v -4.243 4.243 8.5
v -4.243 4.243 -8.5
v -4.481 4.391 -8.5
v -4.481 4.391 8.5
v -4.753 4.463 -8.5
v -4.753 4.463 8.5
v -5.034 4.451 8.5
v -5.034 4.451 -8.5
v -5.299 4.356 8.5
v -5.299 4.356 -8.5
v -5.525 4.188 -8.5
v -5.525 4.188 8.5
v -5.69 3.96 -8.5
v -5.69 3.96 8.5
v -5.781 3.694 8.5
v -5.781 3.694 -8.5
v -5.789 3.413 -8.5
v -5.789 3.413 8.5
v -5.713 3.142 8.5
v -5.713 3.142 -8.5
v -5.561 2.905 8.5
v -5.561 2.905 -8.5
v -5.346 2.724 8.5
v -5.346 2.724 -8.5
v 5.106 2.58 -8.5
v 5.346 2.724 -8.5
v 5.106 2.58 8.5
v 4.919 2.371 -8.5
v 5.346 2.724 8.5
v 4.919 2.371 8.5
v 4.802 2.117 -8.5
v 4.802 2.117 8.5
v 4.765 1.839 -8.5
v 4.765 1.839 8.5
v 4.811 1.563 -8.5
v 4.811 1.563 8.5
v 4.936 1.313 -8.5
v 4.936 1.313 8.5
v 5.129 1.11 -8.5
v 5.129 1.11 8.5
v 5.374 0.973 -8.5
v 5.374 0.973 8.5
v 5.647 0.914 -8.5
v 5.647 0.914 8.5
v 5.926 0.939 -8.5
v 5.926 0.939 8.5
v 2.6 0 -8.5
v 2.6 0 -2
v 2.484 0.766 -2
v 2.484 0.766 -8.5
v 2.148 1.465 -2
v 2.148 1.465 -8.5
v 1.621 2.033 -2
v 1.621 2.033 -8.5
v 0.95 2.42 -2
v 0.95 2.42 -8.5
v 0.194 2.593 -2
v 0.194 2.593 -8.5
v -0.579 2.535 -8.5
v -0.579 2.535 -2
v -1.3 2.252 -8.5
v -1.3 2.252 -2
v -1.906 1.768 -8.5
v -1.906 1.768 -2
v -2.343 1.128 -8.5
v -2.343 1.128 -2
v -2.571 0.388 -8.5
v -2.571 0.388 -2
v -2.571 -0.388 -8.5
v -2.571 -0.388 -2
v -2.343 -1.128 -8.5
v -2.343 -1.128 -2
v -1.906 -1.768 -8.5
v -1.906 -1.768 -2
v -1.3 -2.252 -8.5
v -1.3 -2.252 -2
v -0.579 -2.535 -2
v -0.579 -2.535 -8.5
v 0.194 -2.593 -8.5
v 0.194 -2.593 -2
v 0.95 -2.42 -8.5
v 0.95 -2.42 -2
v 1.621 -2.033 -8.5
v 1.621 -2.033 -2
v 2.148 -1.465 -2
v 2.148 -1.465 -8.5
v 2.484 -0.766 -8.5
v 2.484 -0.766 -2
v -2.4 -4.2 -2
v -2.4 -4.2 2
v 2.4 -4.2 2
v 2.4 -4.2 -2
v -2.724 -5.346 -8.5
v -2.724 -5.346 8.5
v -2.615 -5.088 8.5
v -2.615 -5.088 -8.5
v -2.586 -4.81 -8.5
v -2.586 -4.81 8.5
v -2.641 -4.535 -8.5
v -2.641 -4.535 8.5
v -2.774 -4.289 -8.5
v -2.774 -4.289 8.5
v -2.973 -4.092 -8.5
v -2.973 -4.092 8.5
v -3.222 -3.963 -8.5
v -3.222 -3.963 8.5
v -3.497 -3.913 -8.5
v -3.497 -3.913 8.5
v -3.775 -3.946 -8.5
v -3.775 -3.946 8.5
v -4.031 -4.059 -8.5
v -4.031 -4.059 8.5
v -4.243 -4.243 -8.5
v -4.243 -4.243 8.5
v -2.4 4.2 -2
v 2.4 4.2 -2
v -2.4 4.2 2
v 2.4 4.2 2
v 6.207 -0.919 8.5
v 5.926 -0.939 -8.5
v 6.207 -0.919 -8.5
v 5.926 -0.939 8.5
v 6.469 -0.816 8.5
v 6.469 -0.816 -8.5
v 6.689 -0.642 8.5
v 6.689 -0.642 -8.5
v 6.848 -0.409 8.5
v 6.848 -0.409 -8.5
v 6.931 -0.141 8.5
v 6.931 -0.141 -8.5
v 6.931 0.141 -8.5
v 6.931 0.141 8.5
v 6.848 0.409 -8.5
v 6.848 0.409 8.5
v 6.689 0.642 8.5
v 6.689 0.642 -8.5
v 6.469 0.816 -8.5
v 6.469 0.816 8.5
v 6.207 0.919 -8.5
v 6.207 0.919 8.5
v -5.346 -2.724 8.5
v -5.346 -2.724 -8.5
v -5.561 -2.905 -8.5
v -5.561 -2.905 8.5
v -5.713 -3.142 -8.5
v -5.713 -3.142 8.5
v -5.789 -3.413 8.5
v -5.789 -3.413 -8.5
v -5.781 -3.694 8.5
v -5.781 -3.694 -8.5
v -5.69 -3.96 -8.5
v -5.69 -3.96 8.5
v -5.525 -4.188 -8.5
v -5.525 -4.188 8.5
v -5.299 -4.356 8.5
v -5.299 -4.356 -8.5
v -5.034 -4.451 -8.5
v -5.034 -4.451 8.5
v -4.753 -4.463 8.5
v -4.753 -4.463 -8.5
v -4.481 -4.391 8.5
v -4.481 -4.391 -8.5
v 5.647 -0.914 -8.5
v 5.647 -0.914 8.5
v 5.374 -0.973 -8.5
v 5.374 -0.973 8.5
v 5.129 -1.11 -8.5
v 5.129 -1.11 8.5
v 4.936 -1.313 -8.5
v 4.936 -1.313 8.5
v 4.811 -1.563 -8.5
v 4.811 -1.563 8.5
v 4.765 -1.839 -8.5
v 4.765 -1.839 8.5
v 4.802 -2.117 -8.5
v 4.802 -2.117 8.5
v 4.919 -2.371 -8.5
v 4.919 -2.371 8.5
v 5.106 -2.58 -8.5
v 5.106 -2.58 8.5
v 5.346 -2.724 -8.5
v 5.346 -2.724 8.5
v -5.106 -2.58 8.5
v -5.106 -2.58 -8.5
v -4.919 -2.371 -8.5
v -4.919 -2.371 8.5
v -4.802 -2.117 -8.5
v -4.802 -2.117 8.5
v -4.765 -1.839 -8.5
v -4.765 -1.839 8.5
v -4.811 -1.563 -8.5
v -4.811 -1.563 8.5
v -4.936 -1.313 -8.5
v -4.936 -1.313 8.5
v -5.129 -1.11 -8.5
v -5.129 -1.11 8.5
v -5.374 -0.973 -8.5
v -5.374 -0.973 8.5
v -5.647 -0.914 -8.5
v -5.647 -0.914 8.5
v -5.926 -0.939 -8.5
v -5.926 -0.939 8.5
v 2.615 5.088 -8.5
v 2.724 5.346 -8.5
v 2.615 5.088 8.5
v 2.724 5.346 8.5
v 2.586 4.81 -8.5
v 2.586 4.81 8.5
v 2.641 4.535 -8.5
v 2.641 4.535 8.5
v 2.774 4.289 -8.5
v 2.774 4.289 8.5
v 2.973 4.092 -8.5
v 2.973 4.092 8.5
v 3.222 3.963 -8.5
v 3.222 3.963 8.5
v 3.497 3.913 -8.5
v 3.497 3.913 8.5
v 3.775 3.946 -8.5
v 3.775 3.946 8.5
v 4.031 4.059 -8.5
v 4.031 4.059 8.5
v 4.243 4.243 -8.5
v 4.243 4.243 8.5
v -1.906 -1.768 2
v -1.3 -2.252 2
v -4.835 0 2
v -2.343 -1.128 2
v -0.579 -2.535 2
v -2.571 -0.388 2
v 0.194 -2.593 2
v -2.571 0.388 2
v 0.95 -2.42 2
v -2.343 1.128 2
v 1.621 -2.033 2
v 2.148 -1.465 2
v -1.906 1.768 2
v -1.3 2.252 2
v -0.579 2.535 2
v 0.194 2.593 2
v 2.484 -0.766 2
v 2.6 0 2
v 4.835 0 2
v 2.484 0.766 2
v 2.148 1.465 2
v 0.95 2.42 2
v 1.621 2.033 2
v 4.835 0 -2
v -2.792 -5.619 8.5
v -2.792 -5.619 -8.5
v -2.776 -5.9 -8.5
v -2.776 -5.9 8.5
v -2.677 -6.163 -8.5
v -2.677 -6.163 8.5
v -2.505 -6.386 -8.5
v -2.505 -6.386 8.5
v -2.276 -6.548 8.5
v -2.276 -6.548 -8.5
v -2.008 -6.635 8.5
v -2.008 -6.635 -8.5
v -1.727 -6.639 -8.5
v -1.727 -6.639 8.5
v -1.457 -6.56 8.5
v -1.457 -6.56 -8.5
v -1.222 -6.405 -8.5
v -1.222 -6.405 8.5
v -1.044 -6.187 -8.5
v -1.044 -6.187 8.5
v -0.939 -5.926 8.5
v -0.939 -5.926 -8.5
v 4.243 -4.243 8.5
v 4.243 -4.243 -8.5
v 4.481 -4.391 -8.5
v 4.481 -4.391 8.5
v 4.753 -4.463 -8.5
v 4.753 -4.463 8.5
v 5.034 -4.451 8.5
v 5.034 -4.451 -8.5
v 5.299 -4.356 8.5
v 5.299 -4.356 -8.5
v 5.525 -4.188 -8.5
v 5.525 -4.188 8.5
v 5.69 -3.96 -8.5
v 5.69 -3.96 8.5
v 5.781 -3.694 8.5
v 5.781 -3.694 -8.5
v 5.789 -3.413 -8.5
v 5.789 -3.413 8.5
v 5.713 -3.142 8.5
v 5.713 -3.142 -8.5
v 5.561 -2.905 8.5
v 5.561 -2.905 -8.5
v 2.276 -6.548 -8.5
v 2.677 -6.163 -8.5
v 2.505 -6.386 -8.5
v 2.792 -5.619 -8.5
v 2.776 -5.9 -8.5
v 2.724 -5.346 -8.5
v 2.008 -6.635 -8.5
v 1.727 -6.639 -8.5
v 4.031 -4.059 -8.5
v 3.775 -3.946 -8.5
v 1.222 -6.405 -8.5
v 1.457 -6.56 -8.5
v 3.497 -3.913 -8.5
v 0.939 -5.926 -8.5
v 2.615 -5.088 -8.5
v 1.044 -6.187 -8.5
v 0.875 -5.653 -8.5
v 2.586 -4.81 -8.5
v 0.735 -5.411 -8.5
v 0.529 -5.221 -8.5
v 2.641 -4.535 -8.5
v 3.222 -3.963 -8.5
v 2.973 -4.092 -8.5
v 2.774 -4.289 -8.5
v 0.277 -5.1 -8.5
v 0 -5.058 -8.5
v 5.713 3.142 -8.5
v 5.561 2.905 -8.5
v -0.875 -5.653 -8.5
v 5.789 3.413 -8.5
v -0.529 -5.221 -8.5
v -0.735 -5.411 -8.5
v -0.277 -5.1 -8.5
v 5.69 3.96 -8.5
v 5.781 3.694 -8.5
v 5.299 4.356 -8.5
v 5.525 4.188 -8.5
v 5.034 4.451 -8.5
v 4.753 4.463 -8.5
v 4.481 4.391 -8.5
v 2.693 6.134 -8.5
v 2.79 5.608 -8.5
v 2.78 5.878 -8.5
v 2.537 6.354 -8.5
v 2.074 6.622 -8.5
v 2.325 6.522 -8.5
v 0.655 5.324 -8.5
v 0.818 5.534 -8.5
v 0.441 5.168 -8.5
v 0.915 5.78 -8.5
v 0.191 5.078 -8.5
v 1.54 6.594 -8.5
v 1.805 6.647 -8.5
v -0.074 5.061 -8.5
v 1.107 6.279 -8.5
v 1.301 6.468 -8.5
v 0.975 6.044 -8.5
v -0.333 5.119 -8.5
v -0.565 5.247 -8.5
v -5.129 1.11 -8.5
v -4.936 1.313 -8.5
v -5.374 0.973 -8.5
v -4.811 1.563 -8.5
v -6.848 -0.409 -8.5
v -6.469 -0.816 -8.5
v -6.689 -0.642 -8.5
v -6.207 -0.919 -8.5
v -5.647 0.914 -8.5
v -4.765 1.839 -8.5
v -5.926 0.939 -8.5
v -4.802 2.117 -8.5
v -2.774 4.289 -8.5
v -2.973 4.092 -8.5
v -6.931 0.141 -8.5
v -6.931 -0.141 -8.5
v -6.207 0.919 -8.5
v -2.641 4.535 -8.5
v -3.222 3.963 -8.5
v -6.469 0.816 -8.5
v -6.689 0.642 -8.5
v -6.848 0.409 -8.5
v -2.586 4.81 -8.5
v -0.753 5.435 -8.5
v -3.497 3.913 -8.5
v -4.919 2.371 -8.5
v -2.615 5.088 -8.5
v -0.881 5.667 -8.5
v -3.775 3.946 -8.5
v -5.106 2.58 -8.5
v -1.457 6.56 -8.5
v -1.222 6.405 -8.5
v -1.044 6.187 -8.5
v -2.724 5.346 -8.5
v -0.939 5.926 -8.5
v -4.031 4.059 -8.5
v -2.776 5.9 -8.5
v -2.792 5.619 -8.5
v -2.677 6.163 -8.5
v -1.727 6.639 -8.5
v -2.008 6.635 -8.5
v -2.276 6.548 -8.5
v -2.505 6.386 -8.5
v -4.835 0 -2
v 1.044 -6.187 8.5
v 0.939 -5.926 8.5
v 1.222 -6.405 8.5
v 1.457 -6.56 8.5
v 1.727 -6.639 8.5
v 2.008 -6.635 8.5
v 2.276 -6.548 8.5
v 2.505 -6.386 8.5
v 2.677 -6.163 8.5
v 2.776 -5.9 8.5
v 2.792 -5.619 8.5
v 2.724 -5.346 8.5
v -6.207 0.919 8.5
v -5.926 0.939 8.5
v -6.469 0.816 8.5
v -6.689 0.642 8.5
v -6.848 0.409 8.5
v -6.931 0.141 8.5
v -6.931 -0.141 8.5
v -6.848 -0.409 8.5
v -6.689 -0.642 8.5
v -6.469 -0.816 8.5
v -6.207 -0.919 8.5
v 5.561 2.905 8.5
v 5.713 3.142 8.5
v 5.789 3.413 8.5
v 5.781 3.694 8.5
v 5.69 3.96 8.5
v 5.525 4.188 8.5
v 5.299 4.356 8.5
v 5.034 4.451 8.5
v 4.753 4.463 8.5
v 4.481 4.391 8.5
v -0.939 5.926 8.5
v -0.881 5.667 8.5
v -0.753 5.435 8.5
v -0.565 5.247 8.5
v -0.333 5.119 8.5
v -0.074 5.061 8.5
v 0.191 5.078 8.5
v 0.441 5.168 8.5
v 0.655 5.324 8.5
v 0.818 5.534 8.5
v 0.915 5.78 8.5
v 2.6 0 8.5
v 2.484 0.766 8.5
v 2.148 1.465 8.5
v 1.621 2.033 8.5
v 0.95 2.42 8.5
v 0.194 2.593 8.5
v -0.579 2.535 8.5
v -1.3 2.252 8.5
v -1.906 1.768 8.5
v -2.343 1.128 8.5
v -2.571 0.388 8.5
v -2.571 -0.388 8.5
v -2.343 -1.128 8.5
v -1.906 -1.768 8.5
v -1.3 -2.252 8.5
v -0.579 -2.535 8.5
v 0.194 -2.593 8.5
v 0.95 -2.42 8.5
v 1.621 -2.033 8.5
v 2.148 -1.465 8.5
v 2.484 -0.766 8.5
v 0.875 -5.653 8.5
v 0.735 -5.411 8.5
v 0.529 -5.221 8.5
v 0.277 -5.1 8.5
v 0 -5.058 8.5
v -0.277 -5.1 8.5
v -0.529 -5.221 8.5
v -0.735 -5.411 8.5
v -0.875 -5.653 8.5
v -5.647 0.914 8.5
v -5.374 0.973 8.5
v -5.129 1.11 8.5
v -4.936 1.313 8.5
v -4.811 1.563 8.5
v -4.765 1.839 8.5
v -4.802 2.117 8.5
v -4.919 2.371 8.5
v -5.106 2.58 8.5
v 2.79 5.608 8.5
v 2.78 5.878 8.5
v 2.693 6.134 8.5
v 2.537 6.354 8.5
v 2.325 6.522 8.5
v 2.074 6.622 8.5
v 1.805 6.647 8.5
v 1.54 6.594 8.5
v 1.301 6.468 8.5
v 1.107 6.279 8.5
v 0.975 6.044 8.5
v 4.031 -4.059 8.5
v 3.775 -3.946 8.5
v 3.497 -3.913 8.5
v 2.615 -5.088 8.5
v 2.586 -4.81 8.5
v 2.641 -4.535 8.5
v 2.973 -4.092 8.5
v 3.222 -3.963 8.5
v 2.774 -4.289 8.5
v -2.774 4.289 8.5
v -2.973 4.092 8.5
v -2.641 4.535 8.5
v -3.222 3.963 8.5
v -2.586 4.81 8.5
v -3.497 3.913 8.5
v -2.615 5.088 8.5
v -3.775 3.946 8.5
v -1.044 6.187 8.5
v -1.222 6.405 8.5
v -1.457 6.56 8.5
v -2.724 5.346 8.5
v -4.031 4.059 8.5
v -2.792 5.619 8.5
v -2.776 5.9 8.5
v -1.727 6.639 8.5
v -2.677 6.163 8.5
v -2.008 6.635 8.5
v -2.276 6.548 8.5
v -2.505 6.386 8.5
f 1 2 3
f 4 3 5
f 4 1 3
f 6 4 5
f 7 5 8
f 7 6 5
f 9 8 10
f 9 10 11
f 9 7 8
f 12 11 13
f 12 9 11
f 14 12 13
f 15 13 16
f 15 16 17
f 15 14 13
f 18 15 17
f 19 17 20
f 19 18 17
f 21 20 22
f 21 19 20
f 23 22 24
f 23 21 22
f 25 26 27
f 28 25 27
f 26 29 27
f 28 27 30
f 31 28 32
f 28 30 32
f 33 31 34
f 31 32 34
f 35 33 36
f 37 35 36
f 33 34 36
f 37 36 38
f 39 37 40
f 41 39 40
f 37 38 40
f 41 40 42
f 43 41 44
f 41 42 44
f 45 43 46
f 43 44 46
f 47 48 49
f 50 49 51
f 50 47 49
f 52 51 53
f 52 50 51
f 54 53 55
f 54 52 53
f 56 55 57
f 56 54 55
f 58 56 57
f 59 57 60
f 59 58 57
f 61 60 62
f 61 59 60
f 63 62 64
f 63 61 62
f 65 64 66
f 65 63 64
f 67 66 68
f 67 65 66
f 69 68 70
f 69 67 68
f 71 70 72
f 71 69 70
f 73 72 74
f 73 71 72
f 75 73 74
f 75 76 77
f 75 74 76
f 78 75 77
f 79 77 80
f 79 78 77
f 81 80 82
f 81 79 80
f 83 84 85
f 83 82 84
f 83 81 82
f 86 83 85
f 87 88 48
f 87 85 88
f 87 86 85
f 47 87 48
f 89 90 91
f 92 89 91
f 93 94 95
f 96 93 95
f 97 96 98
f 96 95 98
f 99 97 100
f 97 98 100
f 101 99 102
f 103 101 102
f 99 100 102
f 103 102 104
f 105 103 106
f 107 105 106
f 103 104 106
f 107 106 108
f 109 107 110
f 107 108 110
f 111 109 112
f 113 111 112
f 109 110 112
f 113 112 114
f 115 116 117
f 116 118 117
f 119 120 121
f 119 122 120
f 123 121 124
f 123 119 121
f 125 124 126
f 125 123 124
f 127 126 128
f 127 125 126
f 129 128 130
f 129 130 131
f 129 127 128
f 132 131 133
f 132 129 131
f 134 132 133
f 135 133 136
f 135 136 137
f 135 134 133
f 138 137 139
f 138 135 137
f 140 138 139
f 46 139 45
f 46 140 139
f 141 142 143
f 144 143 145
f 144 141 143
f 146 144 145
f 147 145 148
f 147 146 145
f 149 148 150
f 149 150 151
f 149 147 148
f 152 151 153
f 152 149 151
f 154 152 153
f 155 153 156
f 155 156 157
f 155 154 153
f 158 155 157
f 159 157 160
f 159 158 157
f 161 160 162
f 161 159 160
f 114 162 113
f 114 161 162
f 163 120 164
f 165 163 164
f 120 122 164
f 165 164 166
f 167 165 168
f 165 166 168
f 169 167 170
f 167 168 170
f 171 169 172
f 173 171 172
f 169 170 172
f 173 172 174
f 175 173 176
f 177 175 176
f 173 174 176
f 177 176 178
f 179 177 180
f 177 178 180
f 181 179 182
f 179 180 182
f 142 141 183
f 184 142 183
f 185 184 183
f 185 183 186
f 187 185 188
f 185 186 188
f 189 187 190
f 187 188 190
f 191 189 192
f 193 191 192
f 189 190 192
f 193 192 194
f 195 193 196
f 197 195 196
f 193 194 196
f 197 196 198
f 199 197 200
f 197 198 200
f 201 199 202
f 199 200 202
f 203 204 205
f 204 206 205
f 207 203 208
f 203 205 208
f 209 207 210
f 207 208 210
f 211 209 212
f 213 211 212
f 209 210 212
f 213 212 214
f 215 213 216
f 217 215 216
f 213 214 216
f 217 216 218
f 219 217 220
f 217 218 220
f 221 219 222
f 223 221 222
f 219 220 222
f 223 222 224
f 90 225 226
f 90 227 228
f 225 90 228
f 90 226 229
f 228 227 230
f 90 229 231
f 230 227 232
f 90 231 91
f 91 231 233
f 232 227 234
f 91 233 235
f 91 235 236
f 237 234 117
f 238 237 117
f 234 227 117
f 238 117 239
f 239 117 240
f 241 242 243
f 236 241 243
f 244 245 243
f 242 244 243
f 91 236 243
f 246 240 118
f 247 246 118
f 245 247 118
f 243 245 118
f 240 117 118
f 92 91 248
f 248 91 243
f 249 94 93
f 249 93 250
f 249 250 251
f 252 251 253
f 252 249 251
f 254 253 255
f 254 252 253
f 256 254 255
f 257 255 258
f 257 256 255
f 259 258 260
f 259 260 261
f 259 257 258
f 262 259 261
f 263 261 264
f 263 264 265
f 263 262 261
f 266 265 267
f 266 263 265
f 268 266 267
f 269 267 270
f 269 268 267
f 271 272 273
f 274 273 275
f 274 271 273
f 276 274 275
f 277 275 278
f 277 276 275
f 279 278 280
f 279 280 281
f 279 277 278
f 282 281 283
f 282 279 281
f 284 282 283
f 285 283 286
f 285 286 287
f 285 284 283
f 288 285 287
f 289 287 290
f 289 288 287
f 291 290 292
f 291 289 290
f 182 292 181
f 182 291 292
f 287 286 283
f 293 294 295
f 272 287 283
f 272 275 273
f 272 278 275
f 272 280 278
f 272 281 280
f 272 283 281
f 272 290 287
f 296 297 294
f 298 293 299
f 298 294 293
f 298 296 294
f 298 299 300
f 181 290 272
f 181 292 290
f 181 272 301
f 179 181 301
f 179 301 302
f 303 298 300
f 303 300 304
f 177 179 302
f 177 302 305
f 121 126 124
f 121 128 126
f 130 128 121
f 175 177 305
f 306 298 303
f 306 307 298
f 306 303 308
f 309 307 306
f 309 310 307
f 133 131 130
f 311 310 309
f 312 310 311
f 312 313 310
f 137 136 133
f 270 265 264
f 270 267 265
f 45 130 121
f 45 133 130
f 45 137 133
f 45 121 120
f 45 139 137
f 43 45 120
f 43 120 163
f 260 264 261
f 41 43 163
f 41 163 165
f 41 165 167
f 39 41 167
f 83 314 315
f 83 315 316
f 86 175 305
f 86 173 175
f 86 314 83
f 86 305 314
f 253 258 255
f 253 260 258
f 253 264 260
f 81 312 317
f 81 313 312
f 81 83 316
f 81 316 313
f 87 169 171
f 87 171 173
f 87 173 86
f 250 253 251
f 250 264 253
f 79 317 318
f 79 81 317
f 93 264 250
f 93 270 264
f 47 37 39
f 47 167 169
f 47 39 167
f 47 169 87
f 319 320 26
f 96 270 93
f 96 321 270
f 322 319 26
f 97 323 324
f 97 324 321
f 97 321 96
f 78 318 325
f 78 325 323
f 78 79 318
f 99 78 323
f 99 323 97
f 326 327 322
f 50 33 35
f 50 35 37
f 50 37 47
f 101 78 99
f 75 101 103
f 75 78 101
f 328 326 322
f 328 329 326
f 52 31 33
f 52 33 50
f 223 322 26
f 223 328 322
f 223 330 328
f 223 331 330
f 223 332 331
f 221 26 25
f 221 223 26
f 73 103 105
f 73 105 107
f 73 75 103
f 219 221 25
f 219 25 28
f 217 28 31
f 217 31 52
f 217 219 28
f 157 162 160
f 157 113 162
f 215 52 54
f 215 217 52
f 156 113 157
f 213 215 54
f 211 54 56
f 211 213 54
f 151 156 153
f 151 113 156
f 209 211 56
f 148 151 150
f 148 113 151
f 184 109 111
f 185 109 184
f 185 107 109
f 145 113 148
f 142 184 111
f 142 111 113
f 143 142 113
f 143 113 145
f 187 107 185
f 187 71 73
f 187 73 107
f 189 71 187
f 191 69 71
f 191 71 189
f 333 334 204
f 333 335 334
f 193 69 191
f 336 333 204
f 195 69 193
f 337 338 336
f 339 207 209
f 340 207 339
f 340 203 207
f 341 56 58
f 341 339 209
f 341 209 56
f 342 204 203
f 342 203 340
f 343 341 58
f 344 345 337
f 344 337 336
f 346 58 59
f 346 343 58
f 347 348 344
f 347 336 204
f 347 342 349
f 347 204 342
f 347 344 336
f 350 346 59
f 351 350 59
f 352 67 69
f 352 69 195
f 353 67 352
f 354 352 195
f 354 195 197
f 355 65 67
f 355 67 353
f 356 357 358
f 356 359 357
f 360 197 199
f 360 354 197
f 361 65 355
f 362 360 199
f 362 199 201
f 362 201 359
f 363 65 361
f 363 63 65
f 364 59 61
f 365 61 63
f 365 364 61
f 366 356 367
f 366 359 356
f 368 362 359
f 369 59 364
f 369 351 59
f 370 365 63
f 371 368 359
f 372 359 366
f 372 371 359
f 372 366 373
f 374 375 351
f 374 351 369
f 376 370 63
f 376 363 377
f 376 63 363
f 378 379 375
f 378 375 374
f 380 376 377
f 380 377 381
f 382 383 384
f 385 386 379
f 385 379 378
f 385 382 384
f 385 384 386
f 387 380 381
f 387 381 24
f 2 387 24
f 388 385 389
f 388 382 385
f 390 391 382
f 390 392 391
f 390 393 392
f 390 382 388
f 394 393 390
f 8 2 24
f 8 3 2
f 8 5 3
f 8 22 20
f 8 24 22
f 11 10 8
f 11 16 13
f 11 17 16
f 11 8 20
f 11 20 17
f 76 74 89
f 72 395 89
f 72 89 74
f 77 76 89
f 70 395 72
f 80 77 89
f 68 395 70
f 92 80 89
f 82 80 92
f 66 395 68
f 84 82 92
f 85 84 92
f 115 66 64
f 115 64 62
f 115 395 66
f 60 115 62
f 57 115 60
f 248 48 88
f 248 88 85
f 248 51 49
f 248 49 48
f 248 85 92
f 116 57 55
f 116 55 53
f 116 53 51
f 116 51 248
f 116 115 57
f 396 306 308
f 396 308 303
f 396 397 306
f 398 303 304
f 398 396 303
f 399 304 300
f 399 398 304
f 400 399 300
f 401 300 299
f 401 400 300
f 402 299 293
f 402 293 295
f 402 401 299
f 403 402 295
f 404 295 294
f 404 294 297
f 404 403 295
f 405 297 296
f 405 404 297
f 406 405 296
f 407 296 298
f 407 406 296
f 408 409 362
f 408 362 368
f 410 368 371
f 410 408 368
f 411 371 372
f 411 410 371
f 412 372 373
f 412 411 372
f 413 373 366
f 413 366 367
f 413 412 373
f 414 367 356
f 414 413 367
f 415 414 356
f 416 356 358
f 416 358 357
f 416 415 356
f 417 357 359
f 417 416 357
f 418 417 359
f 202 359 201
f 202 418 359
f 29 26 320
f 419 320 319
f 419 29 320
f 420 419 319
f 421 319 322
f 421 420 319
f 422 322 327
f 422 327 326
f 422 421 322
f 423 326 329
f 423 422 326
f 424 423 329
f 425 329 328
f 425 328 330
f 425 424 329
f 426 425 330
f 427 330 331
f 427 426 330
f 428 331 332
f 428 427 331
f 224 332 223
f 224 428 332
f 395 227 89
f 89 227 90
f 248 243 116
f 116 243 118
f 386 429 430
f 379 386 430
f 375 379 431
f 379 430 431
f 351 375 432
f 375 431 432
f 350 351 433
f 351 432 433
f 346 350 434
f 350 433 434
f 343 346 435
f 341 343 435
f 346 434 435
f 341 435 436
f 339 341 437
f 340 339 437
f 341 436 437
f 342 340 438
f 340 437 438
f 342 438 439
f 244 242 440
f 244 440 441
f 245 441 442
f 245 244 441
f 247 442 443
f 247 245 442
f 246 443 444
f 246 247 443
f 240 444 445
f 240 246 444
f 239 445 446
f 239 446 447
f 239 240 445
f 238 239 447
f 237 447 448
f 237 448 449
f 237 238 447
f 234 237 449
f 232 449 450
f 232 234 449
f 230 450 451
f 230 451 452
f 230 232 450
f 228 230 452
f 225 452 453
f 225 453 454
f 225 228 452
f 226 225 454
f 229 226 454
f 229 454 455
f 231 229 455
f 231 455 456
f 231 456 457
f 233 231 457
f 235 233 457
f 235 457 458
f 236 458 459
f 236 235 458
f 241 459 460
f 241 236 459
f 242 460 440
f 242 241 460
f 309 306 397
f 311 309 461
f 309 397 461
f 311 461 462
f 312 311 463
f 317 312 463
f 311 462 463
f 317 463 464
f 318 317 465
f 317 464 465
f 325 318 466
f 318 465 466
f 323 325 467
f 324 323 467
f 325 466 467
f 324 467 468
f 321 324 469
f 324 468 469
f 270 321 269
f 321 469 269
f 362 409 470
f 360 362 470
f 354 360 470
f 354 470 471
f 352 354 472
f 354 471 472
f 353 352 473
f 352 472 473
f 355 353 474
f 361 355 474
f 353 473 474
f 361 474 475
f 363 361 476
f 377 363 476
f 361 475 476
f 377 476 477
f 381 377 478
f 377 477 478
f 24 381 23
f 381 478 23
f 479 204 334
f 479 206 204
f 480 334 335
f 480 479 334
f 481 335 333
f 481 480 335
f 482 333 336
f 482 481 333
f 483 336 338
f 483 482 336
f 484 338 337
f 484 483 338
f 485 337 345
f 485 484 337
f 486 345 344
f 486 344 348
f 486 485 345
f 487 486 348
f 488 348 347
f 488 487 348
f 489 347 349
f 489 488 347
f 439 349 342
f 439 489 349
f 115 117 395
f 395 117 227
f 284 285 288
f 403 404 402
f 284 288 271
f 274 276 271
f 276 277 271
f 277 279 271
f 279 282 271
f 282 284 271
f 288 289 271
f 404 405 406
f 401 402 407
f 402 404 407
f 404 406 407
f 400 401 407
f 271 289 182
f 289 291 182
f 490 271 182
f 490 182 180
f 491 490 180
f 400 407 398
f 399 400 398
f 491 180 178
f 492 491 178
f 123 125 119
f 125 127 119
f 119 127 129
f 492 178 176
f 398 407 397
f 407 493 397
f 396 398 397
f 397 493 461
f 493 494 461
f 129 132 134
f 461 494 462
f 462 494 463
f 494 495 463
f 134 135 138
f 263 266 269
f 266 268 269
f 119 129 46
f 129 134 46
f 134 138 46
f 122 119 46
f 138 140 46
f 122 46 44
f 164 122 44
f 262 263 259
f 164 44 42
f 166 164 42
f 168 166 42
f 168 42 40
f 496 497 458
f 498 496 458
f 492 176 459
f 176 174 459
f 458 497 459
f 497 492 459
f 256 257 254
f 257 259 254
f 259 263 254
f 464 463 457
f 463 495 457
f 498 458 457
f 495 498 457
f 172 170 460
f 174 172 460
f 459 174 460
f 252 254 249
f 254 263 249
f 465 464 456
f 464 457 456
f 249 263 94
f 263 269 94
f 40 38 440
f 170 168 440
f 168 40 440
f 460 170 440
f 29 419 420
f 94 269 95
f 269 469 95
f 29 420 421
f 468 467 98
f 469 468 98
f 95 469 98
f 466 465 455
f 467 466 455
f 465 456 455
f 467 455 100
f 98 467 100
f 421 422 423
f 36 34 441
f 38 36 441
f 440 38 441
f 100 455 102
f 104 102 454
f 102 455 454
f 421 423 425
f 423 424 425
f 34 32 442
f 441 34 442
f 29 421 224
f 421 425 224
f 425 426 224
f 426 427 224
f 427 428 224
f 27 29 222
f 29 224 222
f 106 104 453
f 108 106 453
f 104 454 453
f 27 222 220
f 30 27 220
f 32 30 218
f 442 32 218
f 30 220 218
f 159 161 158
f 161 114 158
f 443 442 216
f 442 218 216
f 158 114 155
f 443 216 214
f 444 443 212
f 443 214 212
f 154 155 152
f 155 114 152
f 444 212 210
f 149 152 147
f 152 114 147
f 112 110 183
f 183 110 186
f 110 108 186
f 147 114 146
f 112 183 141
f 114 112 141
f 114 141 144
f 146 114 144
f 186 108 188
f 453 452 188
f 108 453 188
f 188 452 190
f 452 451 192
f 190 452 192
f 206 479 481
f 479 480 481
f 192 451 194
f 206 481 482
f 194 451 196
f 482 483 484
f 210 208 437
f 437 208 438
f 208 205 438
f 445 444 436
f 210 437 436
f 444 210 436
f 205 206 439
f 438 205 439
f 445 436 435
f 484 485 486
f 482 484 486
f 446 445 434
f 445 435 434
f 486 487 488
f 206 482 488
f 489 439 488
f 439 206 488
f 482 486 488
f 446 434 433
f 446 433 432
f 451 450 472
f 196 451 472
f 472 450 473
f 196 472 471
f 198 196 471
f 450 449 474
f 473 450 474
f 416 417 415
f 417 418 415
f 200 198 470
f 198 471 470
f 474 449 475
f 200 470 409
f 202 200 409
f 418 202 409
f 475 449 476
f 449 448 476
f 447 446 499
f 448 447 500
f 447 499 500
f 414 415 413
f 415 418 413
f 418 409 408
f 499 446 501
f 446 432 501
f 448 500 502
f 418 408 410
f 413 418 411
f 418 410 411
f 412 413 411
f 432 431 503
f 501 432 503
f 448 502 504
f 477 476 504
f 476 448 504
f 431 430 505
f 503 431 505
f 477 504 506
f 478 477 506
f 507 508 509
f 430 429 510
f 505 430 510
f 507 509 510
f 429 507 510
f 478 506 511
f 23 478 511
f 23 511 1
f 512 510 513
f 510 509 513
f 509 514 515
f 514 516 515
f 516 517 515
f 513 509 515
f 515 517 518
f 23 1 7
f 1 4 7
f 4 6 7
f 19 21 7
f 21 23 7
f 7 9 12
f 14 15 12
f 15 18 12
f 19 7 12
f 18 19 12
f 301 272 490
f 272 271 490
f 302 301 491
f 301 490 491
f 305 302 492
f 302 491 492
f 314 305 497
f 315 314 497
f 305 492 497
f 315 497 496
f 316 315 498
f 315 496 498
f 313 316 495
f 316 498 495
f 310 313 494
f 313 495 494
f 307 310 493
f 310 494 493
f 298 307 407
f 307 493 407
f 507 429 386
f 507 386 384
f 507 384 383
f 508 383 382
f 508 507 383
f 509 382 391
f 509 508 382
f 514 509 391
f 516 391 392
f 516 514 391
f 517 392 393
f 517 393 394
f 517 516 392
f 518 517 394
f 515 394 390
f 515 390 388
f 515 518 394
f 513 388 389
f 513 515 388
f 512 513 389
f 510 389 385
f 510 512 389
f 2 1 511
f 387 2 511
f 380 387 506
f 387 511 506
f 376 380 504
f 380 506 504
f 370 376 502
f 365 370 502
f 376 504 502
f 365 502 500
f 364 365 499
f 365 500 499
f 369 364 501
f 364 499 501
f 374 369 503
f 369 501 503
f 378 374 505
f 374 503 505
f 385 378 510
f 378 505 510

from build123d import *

# Parameters (mm, degrees)
EXTRUDE001_DEPTH = 2
SKETCH_R         = 2.6
EXTRUDE_DEPTH    = 8.5


with BuildPart() as nut_pocket:
    # Sketch001 → Extrude001 (new body, symmetric)
    with BuildSketch(Plane.XY):
        Polygon((-4.835, 0), (-2.4, -4.2), (2.4, -4.2), (4.835, 0), (2.4, 4.2), (-2.4, 4.2), align=None)
    extrude(amount=EXTRUDE001_DEPTH, both=True)


with BuildPart() as cut:
    # Sketch → Extrude (new body, symmetric)
    with BuildSketch(Plane.XY):
        with BuildLine():
            ThreePointArc((-0.938607, 5.92613), (-0.07387, 5.061393), (0.915495, 5.780209))
            ThreePointArc((2.723943, 5.346039), (2.073893, 6.621834), (0.915495, 5.780209))
            ThreePointArc((2.723943, 5.346039), (2.973306, 4.092405), (4.242641, 4.242641))
            ThreePointArc((5.346039, 2.723943), (5.615799, 4.080117), (4.242641, 4.242641))
            ThreePointArc((5.346039, 2.723943), (4.810911, 1.56316), (5.92613, 0.938607))
            ThreePointArc((5.92613, -0.938607), (6.941509, 0), (5.92613, 0.938607))
            ThreePointArc((5.92613, -0.938607), (4.810911, -1.56316), (5.346039, -2.723943))
            ThreePointArc((4.242641, -4.242641), (5.615799, -4.080117), (5.346039, -2.723943))
            ThreePointArc((4.242641, -4.242641), (2.973306, -4.092405), (2.723943, -5.346039))
            ThreePointArc((0.938607, -5.92613), (2.145044, -6.601768), (2.723943, -5.346039))
            ThreePointArc((0.938607, -5.92613), (0, -5.058491), (-0.938607, -5.92613))
            ThreePointArc((-2.723943, -5.346039), (-2.145044, -6.601768), (-0.938607, -5.92613))
            ThreePointArc((-2.723943, -5.346039), (-2.973306, -4.092405), (-4.242641, -4.242641))
            ThreePointArc((-5.346039, -2.723943), (-5.615799, -4.080117), (-4.242641, -4.242641))
            ThreePointArc((-5.346039, -2.723943), (-4.810911, -1.56316), (-5.92613, -0.938607))
            ThreePointArc((-5.92613, 0.938607), (-6.941509, 0), (-5.92613, -0.938607))
            ThreePointArc((-5.92613, 0.938607), (-4.810911, 1.56316), (-5.346039, 2.723943))
            ThreePointArc((-4.242641, 4.242641), (-5.615799, 4.080117), (-5.346039, 2.723943))
            ThreePointArc((-4.242641, 4.242641), (-2.973306, 4.092405), (-2.723943, 5.346039))
            ThreePointArc((-0.938607, 5.92613), (-2.145044, 6.601768), (-2.723943, 5.346039))
        make_face()
        Circle(SKETCH_R, mode=Mode.SUBTRACT)
    extrude(amount=EXTRUDE_DEPTH, both=True)

    # Cut: cut Nut Pocket
    add(nut_pocket.part, mode=Mode.SUBTRACT)


solid = cut.part
